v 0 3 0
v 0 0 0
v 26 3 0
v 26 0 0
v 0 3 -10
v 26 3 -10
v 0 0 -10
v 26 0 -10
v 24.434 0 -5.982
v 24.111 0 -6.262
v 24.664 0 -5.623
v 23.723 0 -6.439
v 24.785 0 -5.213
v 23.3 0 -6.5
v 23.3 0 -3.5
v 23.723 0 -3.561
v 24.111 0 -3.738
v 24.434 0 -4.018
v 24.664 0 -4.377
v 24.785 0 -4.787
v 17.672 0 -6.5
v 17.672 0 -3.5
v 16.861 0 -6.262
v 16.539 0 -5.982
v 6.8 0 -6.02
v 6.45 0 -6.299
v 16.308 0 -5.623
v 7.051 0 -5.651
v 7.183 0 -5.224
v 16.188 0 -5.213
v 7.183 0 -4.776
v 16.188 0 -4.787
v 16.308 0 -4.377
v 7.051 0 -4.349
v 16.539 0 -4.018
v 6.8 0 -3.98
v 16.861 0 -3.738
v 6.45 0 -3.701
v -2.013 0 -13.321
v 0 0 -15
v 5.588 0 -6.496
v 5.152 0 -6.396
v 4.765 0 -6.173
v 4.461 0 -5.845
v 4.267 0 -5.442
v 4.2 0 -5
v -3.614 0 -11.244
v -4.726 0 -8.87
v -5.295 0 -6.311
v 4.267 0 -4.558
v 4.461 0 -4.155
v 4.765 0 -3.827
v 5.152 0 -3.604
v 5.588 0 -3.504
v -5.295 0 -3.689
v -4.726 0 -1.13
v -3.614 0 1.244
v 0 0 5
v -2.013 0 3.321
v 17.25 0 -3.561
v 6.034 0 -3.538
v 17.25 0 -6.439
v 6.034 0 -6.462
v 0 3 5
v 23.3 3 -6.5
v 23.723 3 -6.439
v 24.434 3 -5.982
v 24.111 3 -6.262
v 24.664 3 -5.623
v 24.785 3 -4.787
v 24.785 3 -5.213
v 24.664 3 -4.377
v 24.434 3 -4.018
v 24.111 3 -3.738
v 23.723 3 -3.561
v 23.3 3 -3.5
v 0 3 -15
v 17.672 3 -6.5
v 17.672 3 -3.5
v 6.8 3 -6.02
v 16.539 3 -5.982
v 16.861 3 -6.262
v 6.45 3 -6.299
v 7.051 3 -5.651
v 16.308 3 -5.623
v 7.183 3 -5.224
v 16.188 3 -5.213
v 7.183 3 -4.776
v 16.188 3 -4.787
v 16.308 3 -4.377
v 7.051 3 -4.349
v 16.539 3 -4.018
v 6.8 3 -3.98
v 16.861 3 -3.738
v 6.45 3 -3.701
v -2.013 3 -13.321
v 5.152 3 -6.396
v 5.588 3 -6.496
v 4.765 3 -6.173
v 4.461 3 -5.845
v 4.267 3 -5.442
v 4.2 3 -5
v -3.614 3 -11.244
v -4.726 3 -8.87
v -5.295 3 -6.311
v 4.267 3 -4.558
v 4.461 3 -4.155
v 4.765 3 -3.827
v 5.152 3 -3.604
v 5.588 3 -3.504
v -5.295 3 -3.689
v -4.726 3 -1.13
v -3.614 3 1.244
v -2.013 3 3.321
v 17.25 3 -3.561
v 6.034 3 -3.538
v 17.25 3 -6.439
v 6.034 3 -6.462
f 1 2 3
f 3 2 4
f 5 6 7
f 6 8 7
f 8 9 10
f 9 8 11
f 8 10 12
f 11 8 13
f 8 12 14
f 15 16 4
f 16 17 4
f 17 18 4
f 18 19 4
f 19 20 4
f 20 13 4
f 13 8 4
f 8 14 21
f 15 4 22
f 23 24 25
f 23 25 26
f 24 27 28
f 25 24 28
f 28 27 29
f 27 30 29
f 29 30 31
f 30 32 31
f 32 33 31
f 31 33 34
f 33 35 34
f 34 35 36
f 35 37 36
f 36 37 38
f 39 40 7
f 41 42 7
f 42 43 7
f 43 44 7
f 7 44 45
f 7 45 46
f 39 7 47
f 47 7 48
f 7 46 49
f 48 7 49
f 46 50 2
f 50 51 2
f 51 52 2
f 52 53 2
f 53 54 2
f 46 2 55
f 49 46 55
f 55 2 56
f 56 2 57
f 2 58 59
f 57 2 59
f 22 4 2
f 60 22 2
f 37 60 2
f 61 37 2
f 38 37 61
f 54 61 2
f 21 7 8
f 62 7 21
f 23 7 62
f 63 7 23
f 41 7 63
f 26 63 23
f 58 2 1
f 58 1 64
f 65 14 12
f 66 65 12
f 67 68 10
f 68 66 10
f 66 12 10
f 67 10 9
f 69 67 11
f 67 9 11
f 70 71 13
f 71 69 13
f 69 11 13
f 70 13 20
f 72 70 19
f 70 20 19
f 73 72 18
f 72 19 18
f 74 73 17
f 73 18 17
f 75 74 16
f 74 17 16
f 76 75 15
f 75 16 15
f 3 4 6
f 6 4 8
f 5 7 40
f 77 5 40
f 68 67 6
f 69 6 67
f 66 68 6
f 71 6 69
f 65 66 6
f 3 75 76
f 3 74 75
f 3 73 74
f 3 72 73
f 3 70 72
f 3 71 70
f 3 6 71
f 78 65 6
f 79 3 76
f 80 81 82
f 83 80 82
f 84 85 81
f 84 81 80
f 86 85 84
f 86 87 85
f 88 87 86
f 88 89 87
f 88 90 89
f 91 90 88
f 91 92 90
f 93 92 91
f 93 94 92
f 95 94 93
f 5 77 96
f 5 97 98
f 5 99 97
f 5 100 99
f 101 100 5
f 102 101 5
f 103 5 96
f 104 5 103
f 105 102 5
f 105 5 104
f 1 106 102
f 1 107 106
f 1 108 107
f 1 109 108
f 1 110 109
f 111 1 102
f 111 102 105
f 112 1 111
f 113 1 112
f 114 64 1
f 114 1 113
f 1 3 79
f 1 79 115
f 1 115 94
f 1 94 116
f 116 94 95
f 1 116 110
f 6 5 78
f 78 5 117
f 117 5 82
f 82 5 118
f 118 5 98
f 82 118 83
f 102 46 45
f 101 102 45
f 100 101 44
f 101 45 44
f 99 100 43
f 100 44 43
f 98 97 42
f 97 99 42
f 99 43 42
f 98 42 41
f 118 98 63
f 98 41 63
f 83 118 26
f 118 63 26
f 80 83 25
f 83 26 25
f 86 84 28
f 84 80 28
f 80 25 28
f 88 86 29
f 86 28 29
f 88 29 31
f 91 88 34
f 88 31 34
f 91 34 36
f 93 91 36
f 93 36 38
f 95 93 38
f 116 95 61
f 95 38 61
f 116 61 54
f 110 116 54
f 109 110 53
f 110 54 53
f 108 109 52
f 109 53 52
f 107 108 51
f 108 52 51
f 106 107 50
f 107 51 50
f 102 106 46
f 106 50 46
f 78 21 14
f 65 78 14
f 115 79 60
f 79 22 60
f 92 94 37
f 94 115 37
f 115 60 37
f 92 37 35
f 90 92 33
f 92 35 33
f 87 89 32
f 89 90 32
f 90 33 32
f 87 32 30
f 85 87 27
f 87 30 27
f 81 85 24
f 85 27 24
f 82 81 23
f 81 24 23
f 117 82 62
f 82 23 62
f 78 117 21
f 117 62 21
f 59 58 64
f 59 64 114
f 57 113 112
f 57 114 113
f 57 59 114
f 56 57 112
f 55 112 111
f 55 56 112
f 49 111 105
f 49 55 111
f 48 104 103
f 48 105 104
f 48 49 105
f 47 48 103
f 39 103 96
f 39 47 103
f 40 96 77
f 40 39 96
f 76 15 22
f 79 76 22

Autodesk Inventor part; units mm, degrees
ref_plane "YZ Plane" through (0, 0, 0) normal (1, 0, 0) x (0, 1, 0)
ref_plane "XZ Plane" through (0, 0, 0) normal (0, 1, 0) x (-1, 0, 0)
ref_plane "XY Plane" through (0, 0, 0) normal (0, 0, 1) x (1, 0, 0)
sketch "Sketch1" plane through (0, 0, 0) normal (0, 1, 0) x (-1, 0, 0)
  line L0 (0, 0) -> (-26, 0)
  line L1 (-26, 0) -> (-26, -10)
  line L2 (-26, -10) -> (0, -10)
  line L3 (0, -10) -> (0, 0)
  line L4 (0, 0) -> (0, 5)
  line L5 (0, -10) -> (0, -15)
  circle A0 centre (-5.7, -5) radius 1.5
  arc A1 (-23.3, -3.5) -> (-23.3, -6.5) centre (-23.3, -5) ccw
  line L6 (-23.3, -3.5) -> (-17.6724, -3.5)
  line L7 (-17.6724, -3.5) -> (-17.6724, -6.5)
  line L8 (-17.6724, -6.5) -> (-23.3, -6.5)
  arc A2 (-17.6724, -6.5) -> (-17.6724, -3.5) centre (-17.6724, -5) ccw
  arc A3 (0, -15) -> (0, 5) centre (-6.6332, -5) ccw
  dimension "d0" = 26
  dimension "d1" = 10
  dimension "d5" = 3
  dimension "d7" = 3
  dimension "d8" = 3
  dimension "d9" = 12
extrude "Extrusion1" add sketch "Sketch1" along normal blind 3
properties part number "FPV_Motor_Holder"
